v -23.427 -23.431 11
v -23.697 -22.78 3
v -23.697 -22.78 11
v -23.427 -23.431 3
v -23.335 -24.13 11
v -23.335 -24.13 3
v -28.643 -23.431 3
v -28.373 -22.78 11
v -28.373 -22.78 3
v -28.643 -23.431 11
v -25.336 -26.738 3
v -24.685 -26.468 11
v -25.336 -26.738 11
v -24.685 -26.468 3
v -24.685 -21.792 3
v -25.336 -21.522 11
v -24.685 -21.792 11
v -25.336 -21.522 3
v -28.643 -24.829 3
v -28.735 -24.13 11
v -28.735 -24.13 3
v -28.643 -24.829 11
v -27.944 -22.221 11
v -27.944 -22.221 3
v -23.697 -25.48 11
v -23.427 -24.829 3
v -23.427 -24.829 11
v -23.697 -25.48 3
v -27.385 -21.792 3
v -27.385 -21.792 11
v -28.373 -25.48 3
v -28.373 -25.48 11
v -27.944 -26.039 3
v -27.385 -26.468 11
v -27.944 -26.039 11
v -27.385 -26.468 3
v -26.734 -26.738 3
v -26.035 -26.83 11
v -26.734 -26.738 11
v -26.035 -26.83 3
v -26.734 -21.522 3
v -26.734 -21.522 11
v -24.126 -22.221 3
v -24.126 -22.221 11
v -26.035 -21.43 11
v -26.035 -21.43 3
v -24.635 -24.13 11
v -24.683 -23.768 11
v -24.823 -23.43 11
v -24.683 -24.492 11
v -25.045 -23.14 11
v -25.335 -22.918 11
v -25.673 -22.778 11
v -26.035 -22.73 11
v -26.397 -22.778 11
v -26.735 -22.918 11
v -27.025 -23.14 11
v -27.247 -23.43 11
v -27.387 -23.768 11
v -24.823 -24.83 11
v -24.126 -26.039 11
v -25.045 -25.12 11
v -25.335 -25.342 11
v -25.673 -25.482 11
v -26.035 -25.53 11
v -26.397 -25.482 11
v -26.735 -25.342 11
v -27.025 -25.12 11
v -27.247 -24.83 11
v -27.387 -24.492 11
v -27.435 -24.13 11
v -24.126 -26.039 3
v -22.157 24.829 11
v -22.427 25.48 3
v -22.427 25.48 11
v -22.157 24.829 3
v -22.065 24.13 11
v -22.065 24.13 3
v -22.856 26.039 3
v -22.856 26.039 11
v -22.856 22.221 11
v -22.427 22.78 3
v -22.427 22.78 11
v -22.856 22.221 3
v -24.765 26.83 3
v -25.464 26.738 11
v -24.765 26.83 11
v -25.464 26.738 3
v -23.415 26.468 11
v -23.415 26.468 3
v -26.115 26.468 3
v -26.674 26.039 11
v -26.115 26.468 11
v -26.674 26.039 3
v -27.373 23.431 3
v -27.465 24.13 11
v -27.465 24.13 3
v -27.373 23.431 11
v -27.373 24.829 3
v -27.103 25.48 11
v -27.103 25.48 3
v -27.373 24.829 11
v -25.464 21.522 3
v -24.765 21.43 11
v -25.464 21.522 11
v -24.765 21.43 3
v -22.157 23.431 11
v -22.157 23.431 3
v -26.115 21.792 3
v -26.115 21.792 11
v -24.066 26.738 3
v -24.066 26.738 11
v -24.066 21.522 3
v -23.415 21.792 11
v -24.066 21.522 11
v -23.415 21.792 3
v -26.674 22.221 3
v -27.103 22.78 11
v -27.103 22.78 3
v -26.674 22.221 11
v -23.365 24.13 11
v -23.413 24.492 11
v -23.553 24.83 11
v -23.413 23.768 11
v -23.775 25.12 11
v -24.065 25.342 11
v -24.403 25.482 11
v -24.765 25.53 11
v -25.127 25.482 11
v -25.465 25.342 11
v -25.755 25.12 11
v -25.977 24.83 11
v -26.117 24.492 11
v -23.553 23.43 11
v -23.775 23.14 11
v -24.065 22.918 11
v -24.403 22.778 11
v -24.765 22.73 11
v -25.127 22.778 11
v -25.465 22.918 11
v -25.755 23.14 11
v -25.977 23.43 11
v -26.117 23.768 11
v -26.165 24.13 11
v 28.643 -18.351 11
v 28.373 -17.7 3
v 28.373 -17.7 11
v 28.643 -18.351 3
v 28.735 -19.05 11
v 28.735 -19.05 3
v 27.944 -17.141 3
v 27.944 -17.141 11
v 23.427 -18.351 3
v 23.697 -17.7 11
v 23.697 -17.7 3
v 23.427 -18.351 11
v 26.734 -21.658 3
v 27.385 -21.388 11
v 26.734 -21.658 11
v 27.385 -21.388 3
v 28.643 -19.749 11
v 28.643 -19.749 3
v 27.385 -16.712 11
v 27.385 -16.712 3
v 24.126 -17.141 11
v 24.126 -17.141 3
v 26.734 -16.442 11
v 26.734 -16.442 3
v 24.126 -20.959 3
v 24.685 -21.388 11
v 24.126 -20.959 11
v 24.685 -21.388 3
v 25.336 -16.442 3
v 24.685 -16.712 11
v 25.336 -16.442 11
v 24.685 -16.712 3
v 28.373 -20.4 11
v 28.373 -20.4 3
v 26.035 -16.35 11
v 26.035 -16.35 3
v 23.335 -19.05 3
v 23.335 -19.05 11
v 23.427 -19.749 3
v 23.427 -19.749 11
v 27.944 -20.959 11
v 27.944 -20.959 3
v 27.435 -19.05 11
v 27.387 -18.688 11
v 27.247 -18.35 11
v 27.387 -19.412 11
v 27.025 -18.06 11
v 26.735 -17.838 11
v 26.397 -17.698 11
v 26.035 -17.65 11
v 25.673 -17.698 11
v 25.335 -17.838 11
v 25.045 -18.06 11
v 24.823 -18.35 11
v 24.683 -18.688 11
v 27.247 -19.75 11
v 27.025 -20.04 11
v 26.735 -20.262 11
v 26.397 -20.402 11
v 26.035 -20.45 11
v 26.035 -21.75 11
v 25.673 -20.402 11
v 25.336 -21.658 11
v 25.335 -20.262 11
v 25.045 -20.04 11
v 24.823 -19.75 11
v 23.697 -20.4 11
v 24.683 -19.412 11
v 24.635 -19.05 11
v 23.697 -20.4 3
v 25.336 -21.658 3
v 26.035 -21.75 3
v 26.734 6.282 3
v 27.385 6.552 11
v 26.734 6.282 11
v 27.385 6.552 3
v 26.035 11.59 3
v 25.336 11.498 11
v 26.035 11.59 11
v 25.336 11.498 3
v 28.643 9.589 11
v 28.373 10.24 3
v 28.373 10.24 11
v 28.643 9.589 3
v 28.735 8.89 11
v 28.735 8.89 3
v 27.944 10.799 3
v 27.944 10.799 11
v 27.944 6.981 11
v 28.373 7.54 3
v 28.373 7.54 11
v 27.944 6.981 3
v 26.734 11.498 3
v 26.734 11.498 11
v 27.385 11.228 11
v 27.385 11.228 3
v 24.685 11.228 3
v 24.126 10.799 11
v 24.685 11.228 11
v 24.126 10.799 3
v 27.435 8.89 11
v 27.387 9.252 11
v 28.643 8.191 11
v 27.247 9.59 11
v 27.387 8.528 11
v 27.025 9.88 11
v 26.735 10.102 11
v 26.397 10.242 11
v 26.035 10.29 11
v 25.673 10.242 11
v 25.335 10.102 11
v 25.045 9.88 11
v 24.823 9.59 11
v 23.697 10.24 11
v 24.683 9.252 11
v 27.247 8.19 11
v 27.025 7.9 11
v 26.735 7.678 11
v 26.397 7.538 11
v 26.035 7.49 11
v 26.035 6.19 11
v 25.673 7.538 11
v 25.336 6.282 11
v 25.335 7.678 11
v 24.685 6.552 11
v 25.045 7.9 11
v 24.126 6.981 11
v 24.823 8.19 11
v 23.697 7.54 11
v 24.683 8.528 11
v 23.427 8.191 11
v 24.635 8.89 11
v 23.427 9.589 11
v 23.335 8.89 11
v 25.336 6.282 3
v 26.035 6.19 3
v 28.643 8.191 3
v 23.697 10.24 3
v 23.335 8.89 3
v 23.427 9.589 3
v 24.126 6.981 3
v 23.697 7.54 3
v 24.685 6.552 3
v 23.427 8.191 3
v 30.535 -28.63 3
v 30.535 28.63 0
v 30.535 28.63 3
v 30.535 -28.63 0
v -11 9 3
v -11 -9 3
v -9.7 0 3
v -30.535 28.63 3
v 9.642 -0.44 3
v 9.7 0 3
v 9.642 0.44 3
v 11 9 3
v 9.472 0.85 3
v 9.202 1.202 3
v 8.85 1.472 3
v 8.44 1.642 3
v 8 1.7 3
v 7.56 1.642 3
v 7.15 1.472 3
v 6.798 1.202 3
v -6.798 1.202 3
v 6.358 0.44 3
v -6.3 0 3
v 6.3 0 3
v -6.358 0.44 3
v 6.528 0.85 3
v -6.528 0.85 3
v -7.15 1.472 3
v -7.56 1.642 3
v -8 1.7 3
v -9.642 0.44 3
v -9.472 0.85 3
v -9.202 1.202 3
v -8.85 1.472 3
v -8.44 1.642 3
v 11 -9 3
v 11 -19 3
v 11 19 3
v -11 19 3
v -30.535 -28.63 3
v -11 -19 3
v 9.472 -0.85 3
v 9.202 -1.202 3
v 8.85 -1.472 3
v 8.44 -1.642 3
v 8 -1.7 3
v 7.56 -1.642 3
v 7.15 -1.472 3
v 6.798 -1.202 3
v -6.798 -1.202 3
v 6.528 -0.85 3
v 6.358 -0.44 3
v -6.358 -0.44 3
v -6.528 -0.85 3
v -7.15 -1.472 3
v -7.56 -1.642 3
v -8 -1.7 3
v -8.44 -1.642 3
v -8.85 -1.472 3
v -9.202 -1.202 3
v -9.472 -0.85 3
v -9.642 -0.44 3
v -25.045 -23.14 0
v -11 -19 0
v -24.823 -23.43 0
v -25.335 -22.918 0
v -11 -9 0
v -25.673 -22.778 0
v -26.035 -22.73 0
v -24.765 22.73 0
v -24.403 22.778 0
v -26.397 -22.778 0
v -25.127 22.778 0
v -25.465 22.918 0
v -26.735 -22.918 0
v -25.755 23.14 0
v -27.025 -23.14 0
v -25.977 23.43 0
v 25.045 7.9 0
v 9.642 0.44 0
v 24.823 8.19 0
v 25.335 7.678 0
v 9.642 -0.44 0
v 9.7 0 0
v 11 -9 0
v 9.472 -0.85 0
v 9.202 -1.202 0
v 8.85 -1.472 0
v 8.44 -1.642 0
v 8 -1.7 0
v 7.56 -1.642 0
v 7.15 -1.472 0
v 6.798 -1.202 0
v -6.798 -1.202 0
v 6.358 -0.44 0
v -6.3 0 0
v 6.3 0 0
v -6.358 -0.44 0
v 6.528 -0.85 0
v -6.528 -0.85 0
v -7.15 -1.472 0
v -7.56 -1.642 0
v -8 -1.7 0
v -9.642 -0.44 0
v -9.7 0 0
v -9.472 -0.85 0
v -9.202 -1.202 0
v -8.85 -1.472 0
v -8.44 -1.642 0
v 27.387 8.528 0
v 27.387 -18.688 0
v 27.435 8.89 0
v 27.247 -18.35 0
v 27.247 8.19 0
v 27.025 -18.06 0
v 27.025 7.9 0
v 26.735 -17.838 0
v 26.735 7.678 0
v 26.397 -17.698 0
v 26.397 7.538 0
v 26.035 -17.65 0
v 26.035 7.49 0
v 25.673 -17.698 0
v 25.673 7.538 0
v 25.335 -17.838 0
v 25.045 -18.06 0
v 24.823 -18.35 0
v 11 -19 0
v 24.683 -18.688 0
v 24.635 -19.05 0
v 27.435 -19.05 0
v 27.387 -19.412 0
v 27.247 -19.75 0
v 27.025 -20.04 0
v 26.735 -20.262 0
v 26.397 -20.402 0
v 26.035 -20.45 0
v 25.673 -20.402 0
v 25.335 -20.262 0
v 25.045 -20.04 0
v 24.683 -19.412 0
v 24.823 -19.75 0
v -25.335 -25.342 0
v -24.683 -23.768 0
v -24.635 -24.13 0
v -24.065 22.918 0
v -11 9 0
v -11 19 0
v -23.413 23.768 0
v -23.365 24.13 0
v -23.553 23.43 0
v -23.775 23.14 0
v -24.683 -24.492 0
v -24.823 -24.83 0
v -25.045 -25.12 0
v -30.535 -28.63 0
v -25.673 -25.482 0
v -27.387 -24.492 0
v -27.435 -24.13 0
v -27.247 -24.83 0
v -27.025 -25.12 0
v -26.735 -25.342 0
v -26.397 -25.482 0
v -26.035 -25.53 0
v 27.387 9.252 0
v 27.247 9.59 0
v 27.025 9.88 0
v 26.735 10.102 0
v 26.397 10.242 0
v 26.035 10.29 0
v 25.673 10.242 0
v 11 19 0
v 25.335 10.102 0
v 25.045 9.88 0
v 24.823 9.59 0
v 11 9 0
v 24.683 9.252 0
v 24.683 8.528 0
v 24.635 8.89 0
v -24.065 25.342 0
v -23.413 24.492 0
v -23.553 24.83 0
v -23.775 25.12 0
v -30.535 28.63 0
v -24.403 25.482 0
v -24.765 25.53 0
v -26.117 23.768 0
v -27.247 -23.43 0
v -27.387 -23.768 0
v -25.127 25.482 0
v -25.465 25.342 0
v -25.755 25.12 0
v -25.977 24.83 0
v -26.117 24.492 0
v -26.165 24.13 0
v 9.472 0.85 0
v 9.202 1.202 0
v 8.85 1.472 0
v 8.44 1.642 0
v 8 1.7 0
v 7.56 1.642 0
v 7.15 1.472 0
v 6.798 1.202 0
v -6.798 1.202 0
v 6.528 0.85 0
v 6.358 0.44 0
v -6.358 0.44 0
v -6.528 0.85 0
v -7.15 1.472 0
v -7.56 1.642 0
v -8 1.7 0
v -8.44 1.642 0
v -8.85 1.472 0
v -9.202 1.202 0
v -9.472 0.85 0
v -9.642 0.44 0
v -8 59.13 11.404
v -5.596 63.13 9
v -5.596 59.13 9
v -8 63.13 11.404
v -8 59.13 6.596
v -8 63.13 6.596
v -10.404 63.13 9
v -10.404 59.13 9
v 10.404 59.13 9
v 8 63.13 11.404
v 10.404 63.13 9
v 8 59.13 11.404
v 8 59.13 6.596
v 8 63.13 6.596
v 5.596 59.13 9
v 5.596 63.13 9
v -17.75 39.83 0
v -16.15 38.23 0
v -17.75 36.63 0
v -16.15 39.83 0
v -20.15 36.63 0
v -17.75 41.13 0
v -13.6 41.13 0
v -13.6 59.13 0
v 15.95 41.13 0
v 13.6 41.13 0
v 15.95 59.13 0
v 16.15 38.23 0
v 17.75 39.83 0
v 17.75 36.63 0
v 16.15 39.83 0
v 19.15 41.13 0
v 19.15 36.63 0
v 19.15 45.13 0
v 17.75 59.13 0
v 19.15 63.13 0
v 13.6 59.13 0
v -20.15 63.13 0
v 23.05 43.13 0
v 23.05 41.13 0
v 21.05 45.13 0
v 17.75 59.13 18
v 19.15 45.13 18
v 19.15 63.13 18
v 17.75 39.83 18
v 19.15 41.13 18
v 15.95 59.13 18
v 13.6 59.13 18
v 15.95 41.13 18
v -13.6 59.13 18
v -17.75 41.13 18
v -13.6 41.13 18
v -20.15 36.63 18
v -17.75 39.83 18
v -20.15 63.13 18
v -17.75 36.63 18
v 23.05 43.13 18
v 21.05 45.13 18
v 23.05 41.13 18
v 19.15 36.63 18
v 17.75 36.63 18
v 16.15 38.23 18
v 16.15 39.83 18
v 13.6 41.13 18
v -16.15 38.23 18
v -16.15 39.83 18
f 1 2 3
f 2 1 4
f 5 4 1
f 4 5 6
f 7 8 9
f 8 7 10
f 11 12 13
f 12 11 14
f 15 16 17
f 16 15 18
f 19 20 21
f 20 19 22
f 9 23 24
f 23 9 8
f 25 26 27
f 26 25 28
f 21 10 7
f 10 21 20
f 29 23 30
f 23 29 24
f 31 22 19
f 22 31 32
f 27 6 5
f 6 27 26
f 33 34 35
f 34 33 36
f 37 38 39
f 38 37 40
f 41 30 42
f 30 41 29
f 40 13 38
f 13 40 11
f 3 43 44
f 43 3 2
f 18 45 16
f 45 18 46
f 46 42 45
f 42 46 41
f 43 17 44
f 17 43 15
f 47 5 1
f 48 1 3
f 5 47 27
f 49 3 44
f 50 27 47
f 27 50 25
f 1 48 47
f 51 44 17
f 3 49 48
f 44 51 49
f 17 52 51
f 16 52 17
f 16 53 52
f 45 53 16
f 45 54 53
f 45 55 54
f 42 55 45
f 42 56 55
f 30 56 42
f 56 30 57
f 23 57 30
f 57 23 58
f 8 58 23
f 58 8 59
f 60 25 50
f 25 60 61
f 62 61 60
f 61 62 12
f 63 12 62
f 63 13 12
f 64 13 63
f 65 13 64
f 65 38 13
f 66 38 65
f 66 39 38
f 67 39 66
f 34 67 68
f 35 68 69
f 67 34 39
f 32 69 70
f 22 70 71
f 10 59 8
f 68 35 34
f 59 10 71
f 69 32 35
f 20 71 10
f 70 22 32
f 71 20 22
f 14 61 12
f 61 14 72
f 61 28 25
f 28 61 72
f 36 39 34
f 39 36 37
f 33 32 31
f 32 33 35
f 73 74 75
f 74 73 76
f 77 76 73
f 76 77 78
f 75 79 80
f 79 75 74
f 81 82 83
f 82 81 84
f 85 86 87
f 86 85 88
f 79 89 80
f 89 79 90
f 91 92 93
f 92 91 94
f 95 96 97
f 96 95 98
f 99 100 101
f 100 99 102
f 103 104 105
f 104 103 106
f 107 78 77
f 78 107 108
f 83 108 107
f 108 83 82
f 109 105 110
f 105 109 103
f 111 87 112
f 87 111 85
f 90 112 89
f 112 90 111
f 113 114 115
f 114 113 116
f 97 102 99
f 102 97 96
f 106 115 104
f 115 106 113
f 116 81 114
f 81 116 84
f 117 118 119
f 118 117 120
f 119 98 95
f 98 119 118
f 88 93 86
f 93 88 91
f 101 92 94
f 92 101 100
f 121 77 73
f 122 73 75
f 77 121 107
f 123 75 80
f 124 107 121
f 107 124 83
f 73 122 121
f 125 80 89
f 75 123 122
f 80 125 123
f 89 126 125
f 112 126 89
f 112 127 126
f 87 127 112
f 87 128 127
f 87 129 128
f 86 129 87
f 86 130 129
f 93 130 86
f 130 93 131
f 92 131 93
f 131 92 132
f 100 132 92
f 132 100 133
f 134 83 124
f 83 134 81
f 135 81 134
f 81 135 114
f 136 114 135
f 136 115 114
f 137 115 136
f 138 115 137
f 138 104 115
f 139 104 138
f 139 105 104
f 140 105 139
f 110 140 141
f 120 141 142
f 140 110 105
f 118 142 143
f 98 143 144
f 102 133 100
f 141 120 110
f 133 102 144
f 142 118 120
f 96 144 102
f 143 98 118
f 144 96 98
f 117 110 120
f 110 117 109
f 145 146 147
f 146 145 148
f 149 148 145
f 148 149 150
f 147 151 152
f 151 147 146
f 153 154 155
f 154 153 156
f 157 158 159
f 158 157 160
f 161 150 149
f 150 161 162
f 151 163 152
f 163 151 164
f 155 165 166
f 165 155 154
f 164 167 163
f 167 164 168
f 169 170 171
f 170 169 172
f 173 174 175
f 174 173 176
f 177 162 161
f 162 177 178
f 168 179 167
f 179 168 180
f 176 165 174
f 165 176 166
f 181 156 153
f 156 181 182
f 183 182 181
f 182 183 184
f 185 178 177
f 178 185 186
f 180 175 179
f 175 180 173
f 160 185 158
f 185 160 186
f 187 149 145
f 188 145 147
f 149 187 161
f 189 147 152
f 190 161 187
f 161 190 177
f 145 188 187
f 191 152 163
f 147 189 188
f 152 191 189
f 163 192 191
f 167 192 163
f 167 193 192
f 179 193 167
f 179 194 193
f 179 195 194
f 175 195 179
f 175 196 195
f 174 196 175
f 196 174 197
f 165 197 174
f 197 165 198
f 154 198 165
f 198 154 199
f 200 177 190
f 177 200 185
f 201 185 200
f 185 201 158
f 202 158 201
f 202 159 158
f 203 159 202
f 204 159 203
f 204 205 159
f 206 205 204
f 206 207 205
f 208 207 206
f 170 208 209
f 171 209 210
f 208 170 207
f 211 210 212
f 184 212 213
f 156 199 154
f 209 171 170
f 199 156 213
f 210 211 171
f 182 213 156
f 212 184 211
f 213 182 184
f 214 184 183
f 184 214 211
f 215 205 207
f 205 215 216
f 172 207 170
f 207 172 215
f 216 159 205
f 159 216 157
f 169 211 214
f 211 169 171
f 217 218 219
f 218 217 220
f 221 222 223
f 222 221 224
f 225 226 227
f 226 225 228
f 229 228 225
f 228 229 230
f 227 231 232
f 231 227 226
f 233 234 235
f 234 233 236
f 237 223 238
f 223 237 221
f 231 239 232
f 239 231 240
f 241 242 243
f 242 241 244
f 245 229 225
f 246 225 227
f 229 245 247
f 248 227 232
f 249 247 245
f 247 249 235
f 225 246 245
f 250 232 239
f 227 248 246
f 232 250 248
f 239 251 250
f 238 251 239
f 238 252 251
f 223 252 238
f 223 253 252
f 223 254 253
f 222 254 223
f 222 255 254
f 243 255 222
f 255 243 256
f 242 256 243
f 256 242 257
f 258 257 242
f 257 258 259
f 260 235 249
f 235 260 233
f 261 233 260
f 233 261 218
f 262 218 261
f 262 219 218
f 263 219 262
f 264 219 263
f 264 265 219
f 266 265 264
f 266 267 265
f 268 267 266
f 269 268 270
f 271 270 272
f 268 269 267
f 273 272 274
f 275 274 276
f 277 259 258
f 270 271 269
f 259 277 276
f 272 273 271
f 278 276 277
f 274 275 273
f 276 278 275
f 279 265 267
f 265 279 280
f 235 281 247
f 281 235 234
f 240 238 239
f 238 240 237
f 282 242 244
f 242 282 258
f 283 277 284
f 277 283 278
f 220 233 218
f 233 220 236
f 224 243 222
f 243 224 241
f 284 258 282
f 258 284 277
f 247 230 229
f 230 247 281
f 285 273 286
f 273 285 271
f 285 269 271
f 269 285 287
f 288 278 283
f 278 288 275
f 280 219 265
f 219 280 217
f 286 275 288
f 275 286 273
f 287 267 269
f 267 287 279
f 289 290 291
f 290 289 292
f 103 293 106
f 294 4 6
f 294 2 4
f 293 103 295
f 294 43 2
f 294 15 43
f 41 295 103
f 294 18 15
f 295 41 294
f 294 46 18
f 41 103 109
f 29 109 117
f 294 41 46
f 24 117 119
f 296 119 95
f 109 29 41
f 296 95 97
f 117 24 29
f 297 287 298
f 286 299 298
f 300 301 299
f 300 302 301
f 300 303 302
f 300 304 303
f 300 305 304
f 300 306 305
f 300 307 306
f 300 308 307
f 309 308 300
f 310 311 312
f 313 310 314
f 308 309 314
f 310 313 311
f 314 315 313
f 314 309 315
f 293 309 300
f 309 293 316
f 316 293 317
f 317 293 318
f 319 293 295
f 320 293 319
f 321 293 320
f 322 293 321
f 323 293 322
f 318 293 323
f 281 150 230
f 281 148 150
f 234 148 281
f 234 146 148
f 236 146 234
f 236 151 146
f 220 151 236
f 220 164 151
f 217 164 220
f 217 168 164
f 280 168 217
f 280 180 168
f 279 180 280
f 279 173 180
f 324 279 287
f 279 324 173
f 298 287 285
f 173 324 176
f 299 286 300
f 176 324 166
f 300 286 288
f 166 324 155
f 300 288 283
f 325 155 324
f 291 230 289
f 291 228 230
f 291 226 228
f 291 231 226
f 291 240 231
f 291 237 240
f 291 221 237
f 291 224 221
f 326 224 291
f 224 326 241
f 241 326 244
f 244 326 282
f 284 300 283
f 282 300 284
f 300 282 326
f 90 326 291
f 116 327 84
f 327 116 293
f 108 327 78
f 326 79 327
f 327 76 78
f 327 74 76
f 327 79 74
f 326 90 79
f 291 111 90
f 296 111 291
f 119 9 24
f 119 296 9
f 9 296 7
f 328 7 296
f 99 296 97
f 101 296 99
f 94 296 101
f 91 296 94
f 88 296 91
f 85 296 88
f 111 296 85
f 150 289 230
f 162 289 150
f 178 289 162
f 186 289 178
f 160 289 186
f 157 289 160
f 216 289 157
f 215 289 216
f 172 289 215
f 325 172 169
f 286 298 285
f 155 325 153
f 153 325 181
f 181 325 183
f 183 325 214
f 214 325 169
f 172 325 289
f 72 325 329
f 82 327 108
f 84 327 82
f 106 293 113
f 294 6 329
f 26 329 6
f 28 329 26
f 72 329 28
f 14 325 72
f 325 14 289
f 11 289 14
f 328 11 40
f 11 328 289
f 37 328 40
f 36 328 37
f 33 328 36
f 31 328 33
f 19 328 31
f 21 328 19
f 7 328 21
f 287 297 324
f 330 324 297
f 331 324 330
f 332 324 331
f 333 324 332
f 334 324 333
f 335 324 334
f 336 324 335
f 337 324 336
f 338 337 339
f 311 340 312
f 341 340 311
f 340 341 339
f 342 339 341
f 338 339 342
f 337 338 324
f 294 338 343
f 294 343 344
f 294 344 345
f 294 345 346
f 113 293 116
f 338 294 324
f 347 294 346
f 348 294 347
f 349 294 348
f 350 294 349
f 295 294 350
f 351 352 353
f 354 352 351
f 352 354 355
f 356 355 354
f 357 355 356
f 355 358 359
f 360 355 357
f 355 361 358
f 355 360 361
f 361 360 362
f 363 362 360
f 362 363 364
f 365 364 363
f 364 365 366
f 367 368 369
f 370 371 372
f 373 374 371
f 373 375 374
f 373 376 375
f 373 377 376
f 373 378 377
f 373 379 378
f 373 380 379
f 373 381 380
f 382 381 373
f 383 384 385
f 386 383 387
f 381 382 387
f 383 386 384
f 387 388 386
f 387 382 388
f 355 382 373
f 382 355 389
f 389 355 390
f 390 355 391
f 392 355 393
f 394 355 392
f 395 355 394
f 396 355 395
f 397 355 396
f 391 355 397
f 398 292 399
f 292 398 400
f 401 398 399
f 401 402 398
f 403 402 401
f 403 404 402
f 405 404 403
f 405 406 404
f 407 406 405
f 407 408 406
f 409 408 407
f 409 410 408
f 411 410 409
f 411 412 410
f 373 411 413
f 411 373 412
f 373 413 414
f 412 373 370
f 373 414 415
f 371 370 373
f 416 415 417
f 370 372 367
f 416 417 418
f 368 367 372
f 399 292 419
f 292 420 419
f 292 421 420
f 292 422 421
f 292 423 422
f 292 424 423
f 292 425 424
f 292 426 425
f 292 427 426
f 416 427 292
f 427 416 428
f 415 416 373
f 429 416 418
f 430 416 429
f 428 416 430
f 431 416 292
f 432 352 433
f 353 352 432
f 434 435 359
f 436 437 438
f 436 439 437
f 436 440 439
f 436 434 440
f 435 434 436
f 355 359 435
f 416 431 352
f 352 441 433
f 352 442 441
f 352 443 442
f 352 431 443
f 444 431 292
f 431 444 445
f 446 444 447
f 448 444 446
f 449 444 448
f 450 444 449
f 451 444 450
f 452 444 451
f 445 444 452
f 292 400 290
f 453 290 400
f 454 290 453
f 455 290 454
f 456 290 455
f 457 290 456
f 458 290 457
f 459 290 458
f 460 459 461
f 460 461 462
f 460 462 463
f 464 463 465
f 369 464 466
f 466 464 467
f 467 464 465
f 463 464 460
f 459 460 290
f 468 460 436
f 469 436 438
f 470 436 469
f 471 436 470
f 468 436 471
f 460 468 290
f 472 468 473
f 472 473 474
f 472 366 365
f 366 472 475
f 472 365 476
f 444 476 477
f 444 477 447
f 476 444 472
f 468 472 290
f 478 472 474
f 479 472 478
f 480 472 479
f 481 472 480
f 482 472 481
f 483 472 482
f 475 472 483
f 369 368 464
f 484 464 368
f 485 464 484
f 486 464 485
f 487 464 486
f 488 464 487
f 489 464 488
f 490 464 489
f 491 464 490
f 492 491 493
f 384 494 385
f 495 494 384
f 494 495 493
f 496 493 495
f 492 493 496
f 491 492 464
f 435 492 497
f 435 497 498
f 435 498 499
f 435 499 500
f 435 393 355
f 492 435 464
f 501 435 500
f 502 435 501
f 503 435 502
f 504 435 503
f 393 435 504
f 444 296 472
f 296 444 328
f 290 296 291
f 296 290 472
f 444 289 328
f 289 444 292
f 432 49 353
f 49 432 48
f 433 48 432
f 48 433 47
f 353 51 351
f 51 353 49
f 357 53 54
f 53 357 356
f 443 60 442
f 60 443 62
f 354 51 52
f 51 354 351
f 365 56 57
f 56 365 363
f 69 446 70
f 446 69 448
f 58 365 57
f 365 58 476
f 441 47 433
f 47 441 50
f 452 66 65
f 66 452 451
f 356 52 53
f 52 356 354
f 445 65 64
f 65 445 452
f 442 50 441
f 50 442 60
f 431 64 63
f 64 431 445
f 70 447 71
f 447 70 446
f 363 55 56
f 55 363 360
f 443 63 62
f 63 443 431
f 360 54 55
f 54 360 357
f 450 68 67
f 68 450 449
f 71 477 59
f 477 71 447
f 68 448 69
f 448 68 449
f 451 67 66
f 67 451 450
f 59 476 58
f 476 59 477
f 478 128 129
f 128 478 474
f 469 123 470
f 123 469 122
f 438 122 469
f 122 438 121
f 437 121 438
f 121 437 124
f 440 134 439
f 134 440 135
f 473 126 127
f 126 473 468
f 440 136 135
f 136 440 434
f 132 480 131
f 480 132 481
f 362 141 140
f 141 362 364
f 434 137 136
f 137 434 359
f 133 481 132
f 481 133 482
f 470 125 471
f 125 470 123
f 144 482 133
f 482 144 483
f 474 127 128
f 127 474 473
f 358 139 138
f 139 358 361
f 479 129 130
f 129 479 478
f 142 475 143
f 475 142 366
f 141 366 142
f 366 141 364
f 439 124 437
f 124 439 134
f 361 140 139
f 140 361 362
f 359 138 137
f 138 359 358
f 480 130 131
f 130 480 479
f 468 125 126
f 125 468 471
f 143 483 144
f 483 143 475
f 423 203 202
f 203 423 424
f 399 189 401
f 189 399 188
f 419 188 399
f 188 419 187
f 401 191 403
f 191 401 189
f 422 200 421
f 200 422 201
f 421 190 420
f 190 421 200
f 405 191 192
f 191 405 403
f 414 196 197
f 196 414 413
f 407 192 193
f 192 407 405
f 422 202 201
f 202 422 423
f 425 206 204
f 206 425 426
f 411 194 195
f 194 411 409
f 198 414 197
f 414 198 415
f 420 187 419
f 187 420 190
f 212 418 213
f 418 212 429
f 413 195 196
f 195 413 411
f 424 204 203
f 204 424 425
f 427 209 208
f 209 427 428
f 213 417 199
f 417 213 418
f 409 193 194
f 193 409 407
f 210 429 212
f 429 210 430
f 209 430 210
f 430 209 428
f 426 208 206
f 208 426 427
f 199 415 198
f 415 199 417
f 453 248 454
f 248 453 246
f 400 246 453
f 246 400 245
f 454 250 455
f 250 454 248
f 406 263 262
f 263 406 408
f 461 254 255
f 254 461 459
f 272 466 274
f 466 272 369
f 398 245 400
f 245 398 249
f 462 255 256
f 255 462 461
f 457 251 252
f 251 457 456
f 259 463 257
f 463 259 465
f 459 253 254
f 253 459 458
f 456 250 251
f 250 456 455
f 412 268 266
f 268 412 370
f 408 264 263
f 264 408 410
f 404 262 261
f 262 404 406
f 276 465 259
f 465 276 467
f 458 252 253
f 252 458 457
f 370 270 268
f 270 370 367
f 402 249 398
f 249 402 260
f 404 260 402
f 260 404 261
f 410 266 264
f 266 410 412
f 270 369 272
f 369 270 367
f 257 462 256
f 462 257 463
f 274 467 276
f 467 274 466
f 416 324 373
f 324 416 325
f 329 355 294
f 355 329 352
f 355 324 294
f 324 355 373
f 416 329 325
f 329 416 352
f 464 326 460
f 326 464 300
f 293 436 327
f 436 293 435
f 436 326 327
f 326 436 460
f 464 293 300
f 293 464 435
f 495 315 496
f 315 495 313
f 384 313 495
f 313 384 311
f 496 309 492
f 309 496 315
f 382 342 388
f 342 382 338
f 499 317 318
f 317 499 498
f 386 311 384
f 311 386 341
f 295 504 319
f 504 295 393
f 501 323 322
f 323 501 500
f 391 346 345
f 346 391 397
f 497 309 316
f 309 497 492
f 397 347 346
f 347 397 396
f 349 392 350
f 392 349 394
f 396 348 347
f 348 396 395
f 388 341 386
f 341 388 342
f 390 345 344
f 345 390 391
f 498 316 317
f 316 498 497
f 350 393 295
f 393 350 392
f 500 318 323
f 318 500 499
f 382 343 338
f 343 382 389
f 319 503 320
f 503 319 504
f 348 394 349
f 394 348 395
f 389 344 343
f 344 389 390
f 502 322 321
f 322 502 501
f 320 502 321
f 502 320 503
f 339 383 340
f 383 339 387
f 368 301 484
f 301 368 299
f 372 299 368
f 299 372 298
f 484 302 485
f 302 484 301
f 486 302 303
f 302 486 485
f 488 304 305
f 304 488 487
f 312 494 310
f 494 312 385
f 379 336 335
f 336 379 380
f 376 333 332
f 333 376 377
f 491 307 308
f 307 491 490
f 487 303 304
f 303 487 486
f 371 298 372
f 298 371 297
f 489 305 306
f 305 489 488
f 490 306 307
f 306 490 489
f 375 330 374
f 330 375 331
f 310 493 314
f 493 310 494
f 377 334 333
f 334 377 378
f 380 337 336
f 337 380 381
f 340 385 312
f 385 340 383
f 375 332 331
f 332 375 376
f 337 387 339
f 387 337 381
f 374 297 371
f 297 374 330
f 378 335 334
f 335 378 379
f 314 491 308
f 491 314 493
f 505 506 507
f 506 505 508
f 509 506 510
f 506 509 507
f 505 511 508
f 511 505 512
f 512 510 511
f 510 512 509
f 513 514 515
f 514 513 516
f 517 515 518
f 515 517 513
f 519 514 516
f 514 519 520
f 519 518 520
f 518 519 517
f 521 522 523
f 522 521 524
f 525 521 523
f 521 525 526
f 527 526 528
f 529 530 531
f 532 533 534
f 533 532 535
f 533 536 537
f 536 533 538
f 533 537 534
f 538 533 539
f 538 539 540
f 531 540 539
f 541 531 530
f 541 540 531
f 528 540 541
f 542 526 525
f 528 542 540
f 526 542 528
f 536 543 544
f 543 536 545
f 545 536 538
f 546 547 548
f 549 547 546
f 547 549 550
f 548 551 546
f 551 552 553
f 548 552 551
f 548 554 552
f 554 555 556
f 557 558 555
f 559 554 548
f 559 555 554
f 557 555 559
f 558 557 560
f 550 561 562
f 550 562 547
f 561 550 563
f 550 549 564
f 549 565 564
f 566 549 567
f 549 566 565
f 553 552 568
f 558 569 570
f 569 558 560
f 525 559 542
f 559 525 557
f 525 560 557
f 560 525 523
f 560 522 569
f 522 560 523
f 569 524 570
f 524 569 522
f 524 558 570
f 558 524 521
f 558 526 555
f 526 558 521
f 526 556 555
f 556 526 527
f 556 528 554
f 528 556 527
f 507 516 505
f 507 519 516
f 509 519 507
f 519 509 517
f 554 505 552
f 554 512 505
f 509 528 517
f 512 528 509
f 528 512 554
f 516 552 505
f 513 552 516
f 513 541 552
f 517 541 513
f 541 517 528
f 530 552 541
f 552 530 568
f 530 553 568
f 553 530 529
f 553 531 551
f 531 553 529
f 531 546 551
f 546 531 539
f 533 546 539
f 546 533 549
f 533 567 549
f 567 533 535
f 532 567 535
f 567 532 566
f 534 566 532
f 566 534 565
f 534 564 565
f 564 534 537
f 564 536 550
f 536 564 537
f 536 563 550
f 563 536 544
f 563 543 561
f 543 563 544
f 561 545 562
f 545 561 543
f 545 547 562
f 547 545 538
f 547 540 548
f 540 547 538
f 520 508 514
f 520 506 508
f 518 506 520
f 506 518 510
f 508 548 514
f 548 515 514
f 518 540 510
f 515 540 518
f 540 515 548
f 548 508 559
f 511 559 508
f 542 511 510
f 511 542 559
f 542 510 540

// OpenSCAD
// Arduino Uno R3 DIN rail carrier: a flat plate and a separate spring clip.
// PETG recommended. Print both parts as laid out on Z=0, standoffs upward;
// no supports, 0.2 mm layers, at least 4 perimeters. Keep the latch gap clear.
// Join the clip front to the plate UNDERSIDE with two M3x12 bolts + nuts
// (default dimensions); fit nuts inside the open clip bridge before snapping.
// Board hardware: four M2.5 x 16 nylon bolts and nuts below the plate.
// Put heads at the PCB; use heads at most 4.2 mm wide by the upper-left header.
// The four holes are NOT rectangular. Coordinates below are in mm, viewed
// from the component side, USB at left, origin at the PCB lower-left corner:
// (13.97,2.54), (15.24,50.80), (66.04,7.62), (66.04,35.56).
// These correspond to (550,100),(600,2000),(2600,300),(2600,1400) mil.
// PCB nominal outline is 68.58 x 53.34 mm; mounting holes are 3.2 mm.
// Sized for the Uno R3; verify clone layouts. Ports and headers stay open.
// https://docs.arduino.cc/resources/datasheets/A000066-datasheet.pdf
// https://docs.arduino.cc/hardware/uno-rev3/ (official CAD files)
// Verified against UNO-TH_Rev3e.brd; datasheet section 5.4 omits the
// lower-left X dimension, which the CAD file supplies as 13.97 mm.
// Fits TS35 / EN 60715 / IEC 60715 top-hat rail, 7.5 or 15 mm deep.
// Default interface: 35 mm overall, 1 mm flange; rail_inner locates the seats.
// Depth does not enter the fit: only the outer flange edges are gripped.
// For 1.5 mm sheet (e.g. TS35 x 15), set flange_thickness = 1.5.
// Nominal fit: 0.30 mm TOTAL slot play, 0.25 mm at each outer edge,
// and 1.35 mm retaining overlap per lip (hook_overlap - edge_clearance).
// The beam deflects during engagement; the seated rail has clearance,
// not spring preload. Use rail end stops where sliding must be prevented.
// Checked on the dev server with separate 7.5/1 and 15/1.5 mm rail sections;
// geometry checks do not establish printed spring strength or fatigue life.
// Hook the rigid left lip first, then press the right ramp over the rail.
// Pull the right-hand tab outward to release; do not bend the whole carrier.
// Original geometry; fit-test the clip before fitting electronics.
// Rail references:
// https://eshop.weidmueller.com/en/ts-35x7-5ll-1mstzn/p/0514510000
// https://assets.dam.weidmueller.com/assets/api/ab2b4e3c-189d-4eae-b435-7c5a77e1ac25/Original/MB_BUILDING_EN_2025_WEB.pdf

/* [Carrier] */
plate_thickness = 3; // Flat carrier thickness, mm [2.4:0.2:4]
standoff_height = 8; // Board underside clearance above plate, mm [6:1:12]
standoff_diameter = 5.4; // Narrow boss clears the upper-left header solder, mm [5.4:0.1:5.6]
board_hole = 2.8; // M2.5 clearance through carrier (PCB holes are 3.2), mm [2.7:0.1:3]
edge_margin = 4.5; // Plate border beyond mounting-hole centres, mm [4:0.5:7]
vent_width = 22; // Width of each cooling window, mm [16:1:26]
vent_height = 10; // Height of each cooling window, mm [6:1:12]
part_gap = 8; // Separation between the two printed parts, mm [6:2:16]
hole_lower_left = [13.97,2.54]; // Official Uno R3 lower-left hole XY, mm
hole_upper_left = [15.24,50.80]; // Official Uno R3 upper-left hole XY, mm
hole_lower_right = [66.04,7.62]; // Official Uno R3 lower-right hole XY, mm
hole_upper_right = [66.04,35.56]; // Official Uno R3 upper-right hole XY, mm

/* [Rail fit] */
rail_width = 35; // Outside flange width, mm [34.8:0.1:35.2]
rail_inner = 25; // Seat-position reference; need not match the rail web, mm [24:0.5:27]
flange_thickness = 1; // Measured sheet thickness, mm [1:0.1:1.5]
fit_clearance = 0.3; // Total flange slot clearance, mm [0.2:0.05:0.4]
edge_clearance = 0.25; // Clearance at each outer rail edge, mm [0.2:0.05:0.4]
spring_wall = 1.4; // Flexible beam thickness, mm [1.2:0.1:1.6]
spring_length = 18; // Beam root distance above the rail face, mm [18:1:24]
hook_overlap = 1.6; // Tooth reach inward from the side wall, mm [1.4:0.1:1.8]
clip_width = 18; // Contact length along the rail, mm [14:2:30]
bridge_thickness = 4; // Front mounting bridge thickness, mm [3:0.5:5]
mount_spacing = 16; // Two M3 attachment centres across rail, mm [12:2:20]
mount_hole = 3.4; // M3 shaft clearance, mm [3.3:0.1:3.6]

/* [Hidden] */
$fn = 24; // Facets per circular hole / standoff
cut_extra = 0.1; // Boolean cutter overlap, mm
rigid_wall = 2.4; // Rigid hook side wall thickness, mm
tooth_thickness = 1.6; // Minimum retaining lip thickness, mm
seat_gap = 1.8; // Air gap beside the spring, mm
edge = rail_width/2 + edge_clearance; // Outer side-wall datum, mm
slot = flange_thickness + fit_clearance; // Flange capture slot height, mm
front = spring_length + bridge_thickness; // Mounting face Y coordinate, mm
seat_inner = rail_inner/2 + 1.1; // Keep seats outside the inner opening, mm
seat_outer = edge - seat_gap; // Spring-side rigid seat outer edge, mm

// Cross-section lies in XY. Rail length is Z; rail front is Y=0.
// All material below Y=0 stays within the outer 1.8 mm of each flange.
// The independent right beam flexes in XY, along continuous print layers.
module clip_profile() {
    union() {
        translate([-edge-rigid_wall,spring_length])
            square([2*edge+rigid_wall+spring_wall,bridge_thickness]);
        // Rigid side and the left flange's front seat.
        translate([-edge-rigid_wall,0])
            square([edge+rigid_wall-seat_inner,spring_length+0.1]);
        polygon([[-edge-rigid_wall,0],[-edge,0],[-edge,-slot],
                 [-edge+hook_overlap,-slot],
                 [-edge+hook_overlap,-slot-tooth_thickness],
                 [-edge,-slot-tooth_thickness-hook_overlap],
                 [-edge-rigid_wall,-slot-tooth_thickness-hook_overlap]]);
        // Right seat is separated from the beam all the way to its root.
        translate([seat_inner,0])
            square([seat_outer-seat_inner,spring_length+0.1]);
        polygon([[edge,-slot-tooth_thickness-hook_overlap],
                 [edge+spring_wall,-slot-tooth_thickness-hook_overlap],
                 [edge+spring_wall,spring_length+0.1],
                 [edge,spring_length+0.1],[edge,-slot],
                 [edge-hook_overlap,-slot],
                 [edge-hook_overlap,-slot-tooth_thickness]]);
        // Solid thumb / screwdriver tab, with a chamfered outside corner.
        translate([edge+spring_wall-0.1,0])
            polygon([[0,0],[4,0],[4,2],[2,4],[0,4]]);
    }
}

hole_min = [min(hole_lower_left[0],hole_upper_left[0],hole_lower_right[0],hole_upper_right[0]),
            min(hole_lower_left[1],hole_upper_left[1],hole_lower_right[1],hole_upper_right[1])]; // Hole bounds, mm
hole_max = [max(hole_lower_left[0],hole_upper_left[0],hole_lower_right[0],hole_upper_right[0]),
            max(hole_lower_left[1],hole_upper_left[1],hole_lower_right[1],hole_upper_right[1])]; // Hole bounds, mm
pattern_centre = (hole_min+hole_max)/2; // Follow edits to the mounting coordinates, mm
holes = [hole_lower_left-pattern_centre,hole_upper_left-pattern_centre,
         hole_lower_right-pattern_centre,hole_upper_right-pattern_centre]; // Centred hole coordinates, mm
plate_x = hole_max[0]-hole_min[0] + 2*edge_margin; // Hole bounding width plus borders, mm
plate_y = hole_max[1]-hole_min[1] + 2*edge_margin; // Hole bounding height plus borders, mm

// Diamond bores have 45-degree roofs and accept a round M3 shaft.
// Their across-flats dimension is mount_hole, not the corner-to-corner size.
module attachment_bores() {
    for (x = [-mount_spacing/2,mount_spacing/2])
        translate([x,front+cut_extra,clip_width/2])
            rotate([90,0,0])
                linear_extrude(bridge_thickness+2*cut_extra)
                    rotate(45) square([mount_hole,mount_hole],center=true);
}

module rail_clip() {
    difference() {
        linear_extrude(clip_width) clip_profile();
        attachment_bores();
    }
}

module board_carrier() {
    difference() {
        union() {
            translate([-plate_x/2,-plate_y/2,0])
                cube([plate_x,plate_y,plate_thickness]);
            for (p = holes)
                translate([p[0],p[1],plate_thickness-cut_extra])
                    cylinder(h=standoff_height+cut_extra,d=standoff_diameter);
        }
        for (p = holes)
            translate([p[0],p[1],-cut_extra])
                cylinder(h=plate_thickness+standoff_height+2*cut_extra,d=board_hole);
        // Leave a solid centre band for the clip and room for bolt heads.
        for (y = [-14,14])
            translate([-vent_width/2,y-vent_height/2,-cut_extra])
                cube([vent_width,vent_height,plate_thickness+2*cut_extra]);
        for (x = [-mount_spacing/2,mount_spacing/2])
            translate([x,0,-cut_extra])
                cylinder(h=plate_thickness+2*cut_extra,d=mount_hole);
    }
}

color("#5ccfc0") board_carrier();
color("#d9dde2") translate([0,plate_y/2+part_gap+slot+tooth_thickness+hook_overlap,0])
    rail_clip();
